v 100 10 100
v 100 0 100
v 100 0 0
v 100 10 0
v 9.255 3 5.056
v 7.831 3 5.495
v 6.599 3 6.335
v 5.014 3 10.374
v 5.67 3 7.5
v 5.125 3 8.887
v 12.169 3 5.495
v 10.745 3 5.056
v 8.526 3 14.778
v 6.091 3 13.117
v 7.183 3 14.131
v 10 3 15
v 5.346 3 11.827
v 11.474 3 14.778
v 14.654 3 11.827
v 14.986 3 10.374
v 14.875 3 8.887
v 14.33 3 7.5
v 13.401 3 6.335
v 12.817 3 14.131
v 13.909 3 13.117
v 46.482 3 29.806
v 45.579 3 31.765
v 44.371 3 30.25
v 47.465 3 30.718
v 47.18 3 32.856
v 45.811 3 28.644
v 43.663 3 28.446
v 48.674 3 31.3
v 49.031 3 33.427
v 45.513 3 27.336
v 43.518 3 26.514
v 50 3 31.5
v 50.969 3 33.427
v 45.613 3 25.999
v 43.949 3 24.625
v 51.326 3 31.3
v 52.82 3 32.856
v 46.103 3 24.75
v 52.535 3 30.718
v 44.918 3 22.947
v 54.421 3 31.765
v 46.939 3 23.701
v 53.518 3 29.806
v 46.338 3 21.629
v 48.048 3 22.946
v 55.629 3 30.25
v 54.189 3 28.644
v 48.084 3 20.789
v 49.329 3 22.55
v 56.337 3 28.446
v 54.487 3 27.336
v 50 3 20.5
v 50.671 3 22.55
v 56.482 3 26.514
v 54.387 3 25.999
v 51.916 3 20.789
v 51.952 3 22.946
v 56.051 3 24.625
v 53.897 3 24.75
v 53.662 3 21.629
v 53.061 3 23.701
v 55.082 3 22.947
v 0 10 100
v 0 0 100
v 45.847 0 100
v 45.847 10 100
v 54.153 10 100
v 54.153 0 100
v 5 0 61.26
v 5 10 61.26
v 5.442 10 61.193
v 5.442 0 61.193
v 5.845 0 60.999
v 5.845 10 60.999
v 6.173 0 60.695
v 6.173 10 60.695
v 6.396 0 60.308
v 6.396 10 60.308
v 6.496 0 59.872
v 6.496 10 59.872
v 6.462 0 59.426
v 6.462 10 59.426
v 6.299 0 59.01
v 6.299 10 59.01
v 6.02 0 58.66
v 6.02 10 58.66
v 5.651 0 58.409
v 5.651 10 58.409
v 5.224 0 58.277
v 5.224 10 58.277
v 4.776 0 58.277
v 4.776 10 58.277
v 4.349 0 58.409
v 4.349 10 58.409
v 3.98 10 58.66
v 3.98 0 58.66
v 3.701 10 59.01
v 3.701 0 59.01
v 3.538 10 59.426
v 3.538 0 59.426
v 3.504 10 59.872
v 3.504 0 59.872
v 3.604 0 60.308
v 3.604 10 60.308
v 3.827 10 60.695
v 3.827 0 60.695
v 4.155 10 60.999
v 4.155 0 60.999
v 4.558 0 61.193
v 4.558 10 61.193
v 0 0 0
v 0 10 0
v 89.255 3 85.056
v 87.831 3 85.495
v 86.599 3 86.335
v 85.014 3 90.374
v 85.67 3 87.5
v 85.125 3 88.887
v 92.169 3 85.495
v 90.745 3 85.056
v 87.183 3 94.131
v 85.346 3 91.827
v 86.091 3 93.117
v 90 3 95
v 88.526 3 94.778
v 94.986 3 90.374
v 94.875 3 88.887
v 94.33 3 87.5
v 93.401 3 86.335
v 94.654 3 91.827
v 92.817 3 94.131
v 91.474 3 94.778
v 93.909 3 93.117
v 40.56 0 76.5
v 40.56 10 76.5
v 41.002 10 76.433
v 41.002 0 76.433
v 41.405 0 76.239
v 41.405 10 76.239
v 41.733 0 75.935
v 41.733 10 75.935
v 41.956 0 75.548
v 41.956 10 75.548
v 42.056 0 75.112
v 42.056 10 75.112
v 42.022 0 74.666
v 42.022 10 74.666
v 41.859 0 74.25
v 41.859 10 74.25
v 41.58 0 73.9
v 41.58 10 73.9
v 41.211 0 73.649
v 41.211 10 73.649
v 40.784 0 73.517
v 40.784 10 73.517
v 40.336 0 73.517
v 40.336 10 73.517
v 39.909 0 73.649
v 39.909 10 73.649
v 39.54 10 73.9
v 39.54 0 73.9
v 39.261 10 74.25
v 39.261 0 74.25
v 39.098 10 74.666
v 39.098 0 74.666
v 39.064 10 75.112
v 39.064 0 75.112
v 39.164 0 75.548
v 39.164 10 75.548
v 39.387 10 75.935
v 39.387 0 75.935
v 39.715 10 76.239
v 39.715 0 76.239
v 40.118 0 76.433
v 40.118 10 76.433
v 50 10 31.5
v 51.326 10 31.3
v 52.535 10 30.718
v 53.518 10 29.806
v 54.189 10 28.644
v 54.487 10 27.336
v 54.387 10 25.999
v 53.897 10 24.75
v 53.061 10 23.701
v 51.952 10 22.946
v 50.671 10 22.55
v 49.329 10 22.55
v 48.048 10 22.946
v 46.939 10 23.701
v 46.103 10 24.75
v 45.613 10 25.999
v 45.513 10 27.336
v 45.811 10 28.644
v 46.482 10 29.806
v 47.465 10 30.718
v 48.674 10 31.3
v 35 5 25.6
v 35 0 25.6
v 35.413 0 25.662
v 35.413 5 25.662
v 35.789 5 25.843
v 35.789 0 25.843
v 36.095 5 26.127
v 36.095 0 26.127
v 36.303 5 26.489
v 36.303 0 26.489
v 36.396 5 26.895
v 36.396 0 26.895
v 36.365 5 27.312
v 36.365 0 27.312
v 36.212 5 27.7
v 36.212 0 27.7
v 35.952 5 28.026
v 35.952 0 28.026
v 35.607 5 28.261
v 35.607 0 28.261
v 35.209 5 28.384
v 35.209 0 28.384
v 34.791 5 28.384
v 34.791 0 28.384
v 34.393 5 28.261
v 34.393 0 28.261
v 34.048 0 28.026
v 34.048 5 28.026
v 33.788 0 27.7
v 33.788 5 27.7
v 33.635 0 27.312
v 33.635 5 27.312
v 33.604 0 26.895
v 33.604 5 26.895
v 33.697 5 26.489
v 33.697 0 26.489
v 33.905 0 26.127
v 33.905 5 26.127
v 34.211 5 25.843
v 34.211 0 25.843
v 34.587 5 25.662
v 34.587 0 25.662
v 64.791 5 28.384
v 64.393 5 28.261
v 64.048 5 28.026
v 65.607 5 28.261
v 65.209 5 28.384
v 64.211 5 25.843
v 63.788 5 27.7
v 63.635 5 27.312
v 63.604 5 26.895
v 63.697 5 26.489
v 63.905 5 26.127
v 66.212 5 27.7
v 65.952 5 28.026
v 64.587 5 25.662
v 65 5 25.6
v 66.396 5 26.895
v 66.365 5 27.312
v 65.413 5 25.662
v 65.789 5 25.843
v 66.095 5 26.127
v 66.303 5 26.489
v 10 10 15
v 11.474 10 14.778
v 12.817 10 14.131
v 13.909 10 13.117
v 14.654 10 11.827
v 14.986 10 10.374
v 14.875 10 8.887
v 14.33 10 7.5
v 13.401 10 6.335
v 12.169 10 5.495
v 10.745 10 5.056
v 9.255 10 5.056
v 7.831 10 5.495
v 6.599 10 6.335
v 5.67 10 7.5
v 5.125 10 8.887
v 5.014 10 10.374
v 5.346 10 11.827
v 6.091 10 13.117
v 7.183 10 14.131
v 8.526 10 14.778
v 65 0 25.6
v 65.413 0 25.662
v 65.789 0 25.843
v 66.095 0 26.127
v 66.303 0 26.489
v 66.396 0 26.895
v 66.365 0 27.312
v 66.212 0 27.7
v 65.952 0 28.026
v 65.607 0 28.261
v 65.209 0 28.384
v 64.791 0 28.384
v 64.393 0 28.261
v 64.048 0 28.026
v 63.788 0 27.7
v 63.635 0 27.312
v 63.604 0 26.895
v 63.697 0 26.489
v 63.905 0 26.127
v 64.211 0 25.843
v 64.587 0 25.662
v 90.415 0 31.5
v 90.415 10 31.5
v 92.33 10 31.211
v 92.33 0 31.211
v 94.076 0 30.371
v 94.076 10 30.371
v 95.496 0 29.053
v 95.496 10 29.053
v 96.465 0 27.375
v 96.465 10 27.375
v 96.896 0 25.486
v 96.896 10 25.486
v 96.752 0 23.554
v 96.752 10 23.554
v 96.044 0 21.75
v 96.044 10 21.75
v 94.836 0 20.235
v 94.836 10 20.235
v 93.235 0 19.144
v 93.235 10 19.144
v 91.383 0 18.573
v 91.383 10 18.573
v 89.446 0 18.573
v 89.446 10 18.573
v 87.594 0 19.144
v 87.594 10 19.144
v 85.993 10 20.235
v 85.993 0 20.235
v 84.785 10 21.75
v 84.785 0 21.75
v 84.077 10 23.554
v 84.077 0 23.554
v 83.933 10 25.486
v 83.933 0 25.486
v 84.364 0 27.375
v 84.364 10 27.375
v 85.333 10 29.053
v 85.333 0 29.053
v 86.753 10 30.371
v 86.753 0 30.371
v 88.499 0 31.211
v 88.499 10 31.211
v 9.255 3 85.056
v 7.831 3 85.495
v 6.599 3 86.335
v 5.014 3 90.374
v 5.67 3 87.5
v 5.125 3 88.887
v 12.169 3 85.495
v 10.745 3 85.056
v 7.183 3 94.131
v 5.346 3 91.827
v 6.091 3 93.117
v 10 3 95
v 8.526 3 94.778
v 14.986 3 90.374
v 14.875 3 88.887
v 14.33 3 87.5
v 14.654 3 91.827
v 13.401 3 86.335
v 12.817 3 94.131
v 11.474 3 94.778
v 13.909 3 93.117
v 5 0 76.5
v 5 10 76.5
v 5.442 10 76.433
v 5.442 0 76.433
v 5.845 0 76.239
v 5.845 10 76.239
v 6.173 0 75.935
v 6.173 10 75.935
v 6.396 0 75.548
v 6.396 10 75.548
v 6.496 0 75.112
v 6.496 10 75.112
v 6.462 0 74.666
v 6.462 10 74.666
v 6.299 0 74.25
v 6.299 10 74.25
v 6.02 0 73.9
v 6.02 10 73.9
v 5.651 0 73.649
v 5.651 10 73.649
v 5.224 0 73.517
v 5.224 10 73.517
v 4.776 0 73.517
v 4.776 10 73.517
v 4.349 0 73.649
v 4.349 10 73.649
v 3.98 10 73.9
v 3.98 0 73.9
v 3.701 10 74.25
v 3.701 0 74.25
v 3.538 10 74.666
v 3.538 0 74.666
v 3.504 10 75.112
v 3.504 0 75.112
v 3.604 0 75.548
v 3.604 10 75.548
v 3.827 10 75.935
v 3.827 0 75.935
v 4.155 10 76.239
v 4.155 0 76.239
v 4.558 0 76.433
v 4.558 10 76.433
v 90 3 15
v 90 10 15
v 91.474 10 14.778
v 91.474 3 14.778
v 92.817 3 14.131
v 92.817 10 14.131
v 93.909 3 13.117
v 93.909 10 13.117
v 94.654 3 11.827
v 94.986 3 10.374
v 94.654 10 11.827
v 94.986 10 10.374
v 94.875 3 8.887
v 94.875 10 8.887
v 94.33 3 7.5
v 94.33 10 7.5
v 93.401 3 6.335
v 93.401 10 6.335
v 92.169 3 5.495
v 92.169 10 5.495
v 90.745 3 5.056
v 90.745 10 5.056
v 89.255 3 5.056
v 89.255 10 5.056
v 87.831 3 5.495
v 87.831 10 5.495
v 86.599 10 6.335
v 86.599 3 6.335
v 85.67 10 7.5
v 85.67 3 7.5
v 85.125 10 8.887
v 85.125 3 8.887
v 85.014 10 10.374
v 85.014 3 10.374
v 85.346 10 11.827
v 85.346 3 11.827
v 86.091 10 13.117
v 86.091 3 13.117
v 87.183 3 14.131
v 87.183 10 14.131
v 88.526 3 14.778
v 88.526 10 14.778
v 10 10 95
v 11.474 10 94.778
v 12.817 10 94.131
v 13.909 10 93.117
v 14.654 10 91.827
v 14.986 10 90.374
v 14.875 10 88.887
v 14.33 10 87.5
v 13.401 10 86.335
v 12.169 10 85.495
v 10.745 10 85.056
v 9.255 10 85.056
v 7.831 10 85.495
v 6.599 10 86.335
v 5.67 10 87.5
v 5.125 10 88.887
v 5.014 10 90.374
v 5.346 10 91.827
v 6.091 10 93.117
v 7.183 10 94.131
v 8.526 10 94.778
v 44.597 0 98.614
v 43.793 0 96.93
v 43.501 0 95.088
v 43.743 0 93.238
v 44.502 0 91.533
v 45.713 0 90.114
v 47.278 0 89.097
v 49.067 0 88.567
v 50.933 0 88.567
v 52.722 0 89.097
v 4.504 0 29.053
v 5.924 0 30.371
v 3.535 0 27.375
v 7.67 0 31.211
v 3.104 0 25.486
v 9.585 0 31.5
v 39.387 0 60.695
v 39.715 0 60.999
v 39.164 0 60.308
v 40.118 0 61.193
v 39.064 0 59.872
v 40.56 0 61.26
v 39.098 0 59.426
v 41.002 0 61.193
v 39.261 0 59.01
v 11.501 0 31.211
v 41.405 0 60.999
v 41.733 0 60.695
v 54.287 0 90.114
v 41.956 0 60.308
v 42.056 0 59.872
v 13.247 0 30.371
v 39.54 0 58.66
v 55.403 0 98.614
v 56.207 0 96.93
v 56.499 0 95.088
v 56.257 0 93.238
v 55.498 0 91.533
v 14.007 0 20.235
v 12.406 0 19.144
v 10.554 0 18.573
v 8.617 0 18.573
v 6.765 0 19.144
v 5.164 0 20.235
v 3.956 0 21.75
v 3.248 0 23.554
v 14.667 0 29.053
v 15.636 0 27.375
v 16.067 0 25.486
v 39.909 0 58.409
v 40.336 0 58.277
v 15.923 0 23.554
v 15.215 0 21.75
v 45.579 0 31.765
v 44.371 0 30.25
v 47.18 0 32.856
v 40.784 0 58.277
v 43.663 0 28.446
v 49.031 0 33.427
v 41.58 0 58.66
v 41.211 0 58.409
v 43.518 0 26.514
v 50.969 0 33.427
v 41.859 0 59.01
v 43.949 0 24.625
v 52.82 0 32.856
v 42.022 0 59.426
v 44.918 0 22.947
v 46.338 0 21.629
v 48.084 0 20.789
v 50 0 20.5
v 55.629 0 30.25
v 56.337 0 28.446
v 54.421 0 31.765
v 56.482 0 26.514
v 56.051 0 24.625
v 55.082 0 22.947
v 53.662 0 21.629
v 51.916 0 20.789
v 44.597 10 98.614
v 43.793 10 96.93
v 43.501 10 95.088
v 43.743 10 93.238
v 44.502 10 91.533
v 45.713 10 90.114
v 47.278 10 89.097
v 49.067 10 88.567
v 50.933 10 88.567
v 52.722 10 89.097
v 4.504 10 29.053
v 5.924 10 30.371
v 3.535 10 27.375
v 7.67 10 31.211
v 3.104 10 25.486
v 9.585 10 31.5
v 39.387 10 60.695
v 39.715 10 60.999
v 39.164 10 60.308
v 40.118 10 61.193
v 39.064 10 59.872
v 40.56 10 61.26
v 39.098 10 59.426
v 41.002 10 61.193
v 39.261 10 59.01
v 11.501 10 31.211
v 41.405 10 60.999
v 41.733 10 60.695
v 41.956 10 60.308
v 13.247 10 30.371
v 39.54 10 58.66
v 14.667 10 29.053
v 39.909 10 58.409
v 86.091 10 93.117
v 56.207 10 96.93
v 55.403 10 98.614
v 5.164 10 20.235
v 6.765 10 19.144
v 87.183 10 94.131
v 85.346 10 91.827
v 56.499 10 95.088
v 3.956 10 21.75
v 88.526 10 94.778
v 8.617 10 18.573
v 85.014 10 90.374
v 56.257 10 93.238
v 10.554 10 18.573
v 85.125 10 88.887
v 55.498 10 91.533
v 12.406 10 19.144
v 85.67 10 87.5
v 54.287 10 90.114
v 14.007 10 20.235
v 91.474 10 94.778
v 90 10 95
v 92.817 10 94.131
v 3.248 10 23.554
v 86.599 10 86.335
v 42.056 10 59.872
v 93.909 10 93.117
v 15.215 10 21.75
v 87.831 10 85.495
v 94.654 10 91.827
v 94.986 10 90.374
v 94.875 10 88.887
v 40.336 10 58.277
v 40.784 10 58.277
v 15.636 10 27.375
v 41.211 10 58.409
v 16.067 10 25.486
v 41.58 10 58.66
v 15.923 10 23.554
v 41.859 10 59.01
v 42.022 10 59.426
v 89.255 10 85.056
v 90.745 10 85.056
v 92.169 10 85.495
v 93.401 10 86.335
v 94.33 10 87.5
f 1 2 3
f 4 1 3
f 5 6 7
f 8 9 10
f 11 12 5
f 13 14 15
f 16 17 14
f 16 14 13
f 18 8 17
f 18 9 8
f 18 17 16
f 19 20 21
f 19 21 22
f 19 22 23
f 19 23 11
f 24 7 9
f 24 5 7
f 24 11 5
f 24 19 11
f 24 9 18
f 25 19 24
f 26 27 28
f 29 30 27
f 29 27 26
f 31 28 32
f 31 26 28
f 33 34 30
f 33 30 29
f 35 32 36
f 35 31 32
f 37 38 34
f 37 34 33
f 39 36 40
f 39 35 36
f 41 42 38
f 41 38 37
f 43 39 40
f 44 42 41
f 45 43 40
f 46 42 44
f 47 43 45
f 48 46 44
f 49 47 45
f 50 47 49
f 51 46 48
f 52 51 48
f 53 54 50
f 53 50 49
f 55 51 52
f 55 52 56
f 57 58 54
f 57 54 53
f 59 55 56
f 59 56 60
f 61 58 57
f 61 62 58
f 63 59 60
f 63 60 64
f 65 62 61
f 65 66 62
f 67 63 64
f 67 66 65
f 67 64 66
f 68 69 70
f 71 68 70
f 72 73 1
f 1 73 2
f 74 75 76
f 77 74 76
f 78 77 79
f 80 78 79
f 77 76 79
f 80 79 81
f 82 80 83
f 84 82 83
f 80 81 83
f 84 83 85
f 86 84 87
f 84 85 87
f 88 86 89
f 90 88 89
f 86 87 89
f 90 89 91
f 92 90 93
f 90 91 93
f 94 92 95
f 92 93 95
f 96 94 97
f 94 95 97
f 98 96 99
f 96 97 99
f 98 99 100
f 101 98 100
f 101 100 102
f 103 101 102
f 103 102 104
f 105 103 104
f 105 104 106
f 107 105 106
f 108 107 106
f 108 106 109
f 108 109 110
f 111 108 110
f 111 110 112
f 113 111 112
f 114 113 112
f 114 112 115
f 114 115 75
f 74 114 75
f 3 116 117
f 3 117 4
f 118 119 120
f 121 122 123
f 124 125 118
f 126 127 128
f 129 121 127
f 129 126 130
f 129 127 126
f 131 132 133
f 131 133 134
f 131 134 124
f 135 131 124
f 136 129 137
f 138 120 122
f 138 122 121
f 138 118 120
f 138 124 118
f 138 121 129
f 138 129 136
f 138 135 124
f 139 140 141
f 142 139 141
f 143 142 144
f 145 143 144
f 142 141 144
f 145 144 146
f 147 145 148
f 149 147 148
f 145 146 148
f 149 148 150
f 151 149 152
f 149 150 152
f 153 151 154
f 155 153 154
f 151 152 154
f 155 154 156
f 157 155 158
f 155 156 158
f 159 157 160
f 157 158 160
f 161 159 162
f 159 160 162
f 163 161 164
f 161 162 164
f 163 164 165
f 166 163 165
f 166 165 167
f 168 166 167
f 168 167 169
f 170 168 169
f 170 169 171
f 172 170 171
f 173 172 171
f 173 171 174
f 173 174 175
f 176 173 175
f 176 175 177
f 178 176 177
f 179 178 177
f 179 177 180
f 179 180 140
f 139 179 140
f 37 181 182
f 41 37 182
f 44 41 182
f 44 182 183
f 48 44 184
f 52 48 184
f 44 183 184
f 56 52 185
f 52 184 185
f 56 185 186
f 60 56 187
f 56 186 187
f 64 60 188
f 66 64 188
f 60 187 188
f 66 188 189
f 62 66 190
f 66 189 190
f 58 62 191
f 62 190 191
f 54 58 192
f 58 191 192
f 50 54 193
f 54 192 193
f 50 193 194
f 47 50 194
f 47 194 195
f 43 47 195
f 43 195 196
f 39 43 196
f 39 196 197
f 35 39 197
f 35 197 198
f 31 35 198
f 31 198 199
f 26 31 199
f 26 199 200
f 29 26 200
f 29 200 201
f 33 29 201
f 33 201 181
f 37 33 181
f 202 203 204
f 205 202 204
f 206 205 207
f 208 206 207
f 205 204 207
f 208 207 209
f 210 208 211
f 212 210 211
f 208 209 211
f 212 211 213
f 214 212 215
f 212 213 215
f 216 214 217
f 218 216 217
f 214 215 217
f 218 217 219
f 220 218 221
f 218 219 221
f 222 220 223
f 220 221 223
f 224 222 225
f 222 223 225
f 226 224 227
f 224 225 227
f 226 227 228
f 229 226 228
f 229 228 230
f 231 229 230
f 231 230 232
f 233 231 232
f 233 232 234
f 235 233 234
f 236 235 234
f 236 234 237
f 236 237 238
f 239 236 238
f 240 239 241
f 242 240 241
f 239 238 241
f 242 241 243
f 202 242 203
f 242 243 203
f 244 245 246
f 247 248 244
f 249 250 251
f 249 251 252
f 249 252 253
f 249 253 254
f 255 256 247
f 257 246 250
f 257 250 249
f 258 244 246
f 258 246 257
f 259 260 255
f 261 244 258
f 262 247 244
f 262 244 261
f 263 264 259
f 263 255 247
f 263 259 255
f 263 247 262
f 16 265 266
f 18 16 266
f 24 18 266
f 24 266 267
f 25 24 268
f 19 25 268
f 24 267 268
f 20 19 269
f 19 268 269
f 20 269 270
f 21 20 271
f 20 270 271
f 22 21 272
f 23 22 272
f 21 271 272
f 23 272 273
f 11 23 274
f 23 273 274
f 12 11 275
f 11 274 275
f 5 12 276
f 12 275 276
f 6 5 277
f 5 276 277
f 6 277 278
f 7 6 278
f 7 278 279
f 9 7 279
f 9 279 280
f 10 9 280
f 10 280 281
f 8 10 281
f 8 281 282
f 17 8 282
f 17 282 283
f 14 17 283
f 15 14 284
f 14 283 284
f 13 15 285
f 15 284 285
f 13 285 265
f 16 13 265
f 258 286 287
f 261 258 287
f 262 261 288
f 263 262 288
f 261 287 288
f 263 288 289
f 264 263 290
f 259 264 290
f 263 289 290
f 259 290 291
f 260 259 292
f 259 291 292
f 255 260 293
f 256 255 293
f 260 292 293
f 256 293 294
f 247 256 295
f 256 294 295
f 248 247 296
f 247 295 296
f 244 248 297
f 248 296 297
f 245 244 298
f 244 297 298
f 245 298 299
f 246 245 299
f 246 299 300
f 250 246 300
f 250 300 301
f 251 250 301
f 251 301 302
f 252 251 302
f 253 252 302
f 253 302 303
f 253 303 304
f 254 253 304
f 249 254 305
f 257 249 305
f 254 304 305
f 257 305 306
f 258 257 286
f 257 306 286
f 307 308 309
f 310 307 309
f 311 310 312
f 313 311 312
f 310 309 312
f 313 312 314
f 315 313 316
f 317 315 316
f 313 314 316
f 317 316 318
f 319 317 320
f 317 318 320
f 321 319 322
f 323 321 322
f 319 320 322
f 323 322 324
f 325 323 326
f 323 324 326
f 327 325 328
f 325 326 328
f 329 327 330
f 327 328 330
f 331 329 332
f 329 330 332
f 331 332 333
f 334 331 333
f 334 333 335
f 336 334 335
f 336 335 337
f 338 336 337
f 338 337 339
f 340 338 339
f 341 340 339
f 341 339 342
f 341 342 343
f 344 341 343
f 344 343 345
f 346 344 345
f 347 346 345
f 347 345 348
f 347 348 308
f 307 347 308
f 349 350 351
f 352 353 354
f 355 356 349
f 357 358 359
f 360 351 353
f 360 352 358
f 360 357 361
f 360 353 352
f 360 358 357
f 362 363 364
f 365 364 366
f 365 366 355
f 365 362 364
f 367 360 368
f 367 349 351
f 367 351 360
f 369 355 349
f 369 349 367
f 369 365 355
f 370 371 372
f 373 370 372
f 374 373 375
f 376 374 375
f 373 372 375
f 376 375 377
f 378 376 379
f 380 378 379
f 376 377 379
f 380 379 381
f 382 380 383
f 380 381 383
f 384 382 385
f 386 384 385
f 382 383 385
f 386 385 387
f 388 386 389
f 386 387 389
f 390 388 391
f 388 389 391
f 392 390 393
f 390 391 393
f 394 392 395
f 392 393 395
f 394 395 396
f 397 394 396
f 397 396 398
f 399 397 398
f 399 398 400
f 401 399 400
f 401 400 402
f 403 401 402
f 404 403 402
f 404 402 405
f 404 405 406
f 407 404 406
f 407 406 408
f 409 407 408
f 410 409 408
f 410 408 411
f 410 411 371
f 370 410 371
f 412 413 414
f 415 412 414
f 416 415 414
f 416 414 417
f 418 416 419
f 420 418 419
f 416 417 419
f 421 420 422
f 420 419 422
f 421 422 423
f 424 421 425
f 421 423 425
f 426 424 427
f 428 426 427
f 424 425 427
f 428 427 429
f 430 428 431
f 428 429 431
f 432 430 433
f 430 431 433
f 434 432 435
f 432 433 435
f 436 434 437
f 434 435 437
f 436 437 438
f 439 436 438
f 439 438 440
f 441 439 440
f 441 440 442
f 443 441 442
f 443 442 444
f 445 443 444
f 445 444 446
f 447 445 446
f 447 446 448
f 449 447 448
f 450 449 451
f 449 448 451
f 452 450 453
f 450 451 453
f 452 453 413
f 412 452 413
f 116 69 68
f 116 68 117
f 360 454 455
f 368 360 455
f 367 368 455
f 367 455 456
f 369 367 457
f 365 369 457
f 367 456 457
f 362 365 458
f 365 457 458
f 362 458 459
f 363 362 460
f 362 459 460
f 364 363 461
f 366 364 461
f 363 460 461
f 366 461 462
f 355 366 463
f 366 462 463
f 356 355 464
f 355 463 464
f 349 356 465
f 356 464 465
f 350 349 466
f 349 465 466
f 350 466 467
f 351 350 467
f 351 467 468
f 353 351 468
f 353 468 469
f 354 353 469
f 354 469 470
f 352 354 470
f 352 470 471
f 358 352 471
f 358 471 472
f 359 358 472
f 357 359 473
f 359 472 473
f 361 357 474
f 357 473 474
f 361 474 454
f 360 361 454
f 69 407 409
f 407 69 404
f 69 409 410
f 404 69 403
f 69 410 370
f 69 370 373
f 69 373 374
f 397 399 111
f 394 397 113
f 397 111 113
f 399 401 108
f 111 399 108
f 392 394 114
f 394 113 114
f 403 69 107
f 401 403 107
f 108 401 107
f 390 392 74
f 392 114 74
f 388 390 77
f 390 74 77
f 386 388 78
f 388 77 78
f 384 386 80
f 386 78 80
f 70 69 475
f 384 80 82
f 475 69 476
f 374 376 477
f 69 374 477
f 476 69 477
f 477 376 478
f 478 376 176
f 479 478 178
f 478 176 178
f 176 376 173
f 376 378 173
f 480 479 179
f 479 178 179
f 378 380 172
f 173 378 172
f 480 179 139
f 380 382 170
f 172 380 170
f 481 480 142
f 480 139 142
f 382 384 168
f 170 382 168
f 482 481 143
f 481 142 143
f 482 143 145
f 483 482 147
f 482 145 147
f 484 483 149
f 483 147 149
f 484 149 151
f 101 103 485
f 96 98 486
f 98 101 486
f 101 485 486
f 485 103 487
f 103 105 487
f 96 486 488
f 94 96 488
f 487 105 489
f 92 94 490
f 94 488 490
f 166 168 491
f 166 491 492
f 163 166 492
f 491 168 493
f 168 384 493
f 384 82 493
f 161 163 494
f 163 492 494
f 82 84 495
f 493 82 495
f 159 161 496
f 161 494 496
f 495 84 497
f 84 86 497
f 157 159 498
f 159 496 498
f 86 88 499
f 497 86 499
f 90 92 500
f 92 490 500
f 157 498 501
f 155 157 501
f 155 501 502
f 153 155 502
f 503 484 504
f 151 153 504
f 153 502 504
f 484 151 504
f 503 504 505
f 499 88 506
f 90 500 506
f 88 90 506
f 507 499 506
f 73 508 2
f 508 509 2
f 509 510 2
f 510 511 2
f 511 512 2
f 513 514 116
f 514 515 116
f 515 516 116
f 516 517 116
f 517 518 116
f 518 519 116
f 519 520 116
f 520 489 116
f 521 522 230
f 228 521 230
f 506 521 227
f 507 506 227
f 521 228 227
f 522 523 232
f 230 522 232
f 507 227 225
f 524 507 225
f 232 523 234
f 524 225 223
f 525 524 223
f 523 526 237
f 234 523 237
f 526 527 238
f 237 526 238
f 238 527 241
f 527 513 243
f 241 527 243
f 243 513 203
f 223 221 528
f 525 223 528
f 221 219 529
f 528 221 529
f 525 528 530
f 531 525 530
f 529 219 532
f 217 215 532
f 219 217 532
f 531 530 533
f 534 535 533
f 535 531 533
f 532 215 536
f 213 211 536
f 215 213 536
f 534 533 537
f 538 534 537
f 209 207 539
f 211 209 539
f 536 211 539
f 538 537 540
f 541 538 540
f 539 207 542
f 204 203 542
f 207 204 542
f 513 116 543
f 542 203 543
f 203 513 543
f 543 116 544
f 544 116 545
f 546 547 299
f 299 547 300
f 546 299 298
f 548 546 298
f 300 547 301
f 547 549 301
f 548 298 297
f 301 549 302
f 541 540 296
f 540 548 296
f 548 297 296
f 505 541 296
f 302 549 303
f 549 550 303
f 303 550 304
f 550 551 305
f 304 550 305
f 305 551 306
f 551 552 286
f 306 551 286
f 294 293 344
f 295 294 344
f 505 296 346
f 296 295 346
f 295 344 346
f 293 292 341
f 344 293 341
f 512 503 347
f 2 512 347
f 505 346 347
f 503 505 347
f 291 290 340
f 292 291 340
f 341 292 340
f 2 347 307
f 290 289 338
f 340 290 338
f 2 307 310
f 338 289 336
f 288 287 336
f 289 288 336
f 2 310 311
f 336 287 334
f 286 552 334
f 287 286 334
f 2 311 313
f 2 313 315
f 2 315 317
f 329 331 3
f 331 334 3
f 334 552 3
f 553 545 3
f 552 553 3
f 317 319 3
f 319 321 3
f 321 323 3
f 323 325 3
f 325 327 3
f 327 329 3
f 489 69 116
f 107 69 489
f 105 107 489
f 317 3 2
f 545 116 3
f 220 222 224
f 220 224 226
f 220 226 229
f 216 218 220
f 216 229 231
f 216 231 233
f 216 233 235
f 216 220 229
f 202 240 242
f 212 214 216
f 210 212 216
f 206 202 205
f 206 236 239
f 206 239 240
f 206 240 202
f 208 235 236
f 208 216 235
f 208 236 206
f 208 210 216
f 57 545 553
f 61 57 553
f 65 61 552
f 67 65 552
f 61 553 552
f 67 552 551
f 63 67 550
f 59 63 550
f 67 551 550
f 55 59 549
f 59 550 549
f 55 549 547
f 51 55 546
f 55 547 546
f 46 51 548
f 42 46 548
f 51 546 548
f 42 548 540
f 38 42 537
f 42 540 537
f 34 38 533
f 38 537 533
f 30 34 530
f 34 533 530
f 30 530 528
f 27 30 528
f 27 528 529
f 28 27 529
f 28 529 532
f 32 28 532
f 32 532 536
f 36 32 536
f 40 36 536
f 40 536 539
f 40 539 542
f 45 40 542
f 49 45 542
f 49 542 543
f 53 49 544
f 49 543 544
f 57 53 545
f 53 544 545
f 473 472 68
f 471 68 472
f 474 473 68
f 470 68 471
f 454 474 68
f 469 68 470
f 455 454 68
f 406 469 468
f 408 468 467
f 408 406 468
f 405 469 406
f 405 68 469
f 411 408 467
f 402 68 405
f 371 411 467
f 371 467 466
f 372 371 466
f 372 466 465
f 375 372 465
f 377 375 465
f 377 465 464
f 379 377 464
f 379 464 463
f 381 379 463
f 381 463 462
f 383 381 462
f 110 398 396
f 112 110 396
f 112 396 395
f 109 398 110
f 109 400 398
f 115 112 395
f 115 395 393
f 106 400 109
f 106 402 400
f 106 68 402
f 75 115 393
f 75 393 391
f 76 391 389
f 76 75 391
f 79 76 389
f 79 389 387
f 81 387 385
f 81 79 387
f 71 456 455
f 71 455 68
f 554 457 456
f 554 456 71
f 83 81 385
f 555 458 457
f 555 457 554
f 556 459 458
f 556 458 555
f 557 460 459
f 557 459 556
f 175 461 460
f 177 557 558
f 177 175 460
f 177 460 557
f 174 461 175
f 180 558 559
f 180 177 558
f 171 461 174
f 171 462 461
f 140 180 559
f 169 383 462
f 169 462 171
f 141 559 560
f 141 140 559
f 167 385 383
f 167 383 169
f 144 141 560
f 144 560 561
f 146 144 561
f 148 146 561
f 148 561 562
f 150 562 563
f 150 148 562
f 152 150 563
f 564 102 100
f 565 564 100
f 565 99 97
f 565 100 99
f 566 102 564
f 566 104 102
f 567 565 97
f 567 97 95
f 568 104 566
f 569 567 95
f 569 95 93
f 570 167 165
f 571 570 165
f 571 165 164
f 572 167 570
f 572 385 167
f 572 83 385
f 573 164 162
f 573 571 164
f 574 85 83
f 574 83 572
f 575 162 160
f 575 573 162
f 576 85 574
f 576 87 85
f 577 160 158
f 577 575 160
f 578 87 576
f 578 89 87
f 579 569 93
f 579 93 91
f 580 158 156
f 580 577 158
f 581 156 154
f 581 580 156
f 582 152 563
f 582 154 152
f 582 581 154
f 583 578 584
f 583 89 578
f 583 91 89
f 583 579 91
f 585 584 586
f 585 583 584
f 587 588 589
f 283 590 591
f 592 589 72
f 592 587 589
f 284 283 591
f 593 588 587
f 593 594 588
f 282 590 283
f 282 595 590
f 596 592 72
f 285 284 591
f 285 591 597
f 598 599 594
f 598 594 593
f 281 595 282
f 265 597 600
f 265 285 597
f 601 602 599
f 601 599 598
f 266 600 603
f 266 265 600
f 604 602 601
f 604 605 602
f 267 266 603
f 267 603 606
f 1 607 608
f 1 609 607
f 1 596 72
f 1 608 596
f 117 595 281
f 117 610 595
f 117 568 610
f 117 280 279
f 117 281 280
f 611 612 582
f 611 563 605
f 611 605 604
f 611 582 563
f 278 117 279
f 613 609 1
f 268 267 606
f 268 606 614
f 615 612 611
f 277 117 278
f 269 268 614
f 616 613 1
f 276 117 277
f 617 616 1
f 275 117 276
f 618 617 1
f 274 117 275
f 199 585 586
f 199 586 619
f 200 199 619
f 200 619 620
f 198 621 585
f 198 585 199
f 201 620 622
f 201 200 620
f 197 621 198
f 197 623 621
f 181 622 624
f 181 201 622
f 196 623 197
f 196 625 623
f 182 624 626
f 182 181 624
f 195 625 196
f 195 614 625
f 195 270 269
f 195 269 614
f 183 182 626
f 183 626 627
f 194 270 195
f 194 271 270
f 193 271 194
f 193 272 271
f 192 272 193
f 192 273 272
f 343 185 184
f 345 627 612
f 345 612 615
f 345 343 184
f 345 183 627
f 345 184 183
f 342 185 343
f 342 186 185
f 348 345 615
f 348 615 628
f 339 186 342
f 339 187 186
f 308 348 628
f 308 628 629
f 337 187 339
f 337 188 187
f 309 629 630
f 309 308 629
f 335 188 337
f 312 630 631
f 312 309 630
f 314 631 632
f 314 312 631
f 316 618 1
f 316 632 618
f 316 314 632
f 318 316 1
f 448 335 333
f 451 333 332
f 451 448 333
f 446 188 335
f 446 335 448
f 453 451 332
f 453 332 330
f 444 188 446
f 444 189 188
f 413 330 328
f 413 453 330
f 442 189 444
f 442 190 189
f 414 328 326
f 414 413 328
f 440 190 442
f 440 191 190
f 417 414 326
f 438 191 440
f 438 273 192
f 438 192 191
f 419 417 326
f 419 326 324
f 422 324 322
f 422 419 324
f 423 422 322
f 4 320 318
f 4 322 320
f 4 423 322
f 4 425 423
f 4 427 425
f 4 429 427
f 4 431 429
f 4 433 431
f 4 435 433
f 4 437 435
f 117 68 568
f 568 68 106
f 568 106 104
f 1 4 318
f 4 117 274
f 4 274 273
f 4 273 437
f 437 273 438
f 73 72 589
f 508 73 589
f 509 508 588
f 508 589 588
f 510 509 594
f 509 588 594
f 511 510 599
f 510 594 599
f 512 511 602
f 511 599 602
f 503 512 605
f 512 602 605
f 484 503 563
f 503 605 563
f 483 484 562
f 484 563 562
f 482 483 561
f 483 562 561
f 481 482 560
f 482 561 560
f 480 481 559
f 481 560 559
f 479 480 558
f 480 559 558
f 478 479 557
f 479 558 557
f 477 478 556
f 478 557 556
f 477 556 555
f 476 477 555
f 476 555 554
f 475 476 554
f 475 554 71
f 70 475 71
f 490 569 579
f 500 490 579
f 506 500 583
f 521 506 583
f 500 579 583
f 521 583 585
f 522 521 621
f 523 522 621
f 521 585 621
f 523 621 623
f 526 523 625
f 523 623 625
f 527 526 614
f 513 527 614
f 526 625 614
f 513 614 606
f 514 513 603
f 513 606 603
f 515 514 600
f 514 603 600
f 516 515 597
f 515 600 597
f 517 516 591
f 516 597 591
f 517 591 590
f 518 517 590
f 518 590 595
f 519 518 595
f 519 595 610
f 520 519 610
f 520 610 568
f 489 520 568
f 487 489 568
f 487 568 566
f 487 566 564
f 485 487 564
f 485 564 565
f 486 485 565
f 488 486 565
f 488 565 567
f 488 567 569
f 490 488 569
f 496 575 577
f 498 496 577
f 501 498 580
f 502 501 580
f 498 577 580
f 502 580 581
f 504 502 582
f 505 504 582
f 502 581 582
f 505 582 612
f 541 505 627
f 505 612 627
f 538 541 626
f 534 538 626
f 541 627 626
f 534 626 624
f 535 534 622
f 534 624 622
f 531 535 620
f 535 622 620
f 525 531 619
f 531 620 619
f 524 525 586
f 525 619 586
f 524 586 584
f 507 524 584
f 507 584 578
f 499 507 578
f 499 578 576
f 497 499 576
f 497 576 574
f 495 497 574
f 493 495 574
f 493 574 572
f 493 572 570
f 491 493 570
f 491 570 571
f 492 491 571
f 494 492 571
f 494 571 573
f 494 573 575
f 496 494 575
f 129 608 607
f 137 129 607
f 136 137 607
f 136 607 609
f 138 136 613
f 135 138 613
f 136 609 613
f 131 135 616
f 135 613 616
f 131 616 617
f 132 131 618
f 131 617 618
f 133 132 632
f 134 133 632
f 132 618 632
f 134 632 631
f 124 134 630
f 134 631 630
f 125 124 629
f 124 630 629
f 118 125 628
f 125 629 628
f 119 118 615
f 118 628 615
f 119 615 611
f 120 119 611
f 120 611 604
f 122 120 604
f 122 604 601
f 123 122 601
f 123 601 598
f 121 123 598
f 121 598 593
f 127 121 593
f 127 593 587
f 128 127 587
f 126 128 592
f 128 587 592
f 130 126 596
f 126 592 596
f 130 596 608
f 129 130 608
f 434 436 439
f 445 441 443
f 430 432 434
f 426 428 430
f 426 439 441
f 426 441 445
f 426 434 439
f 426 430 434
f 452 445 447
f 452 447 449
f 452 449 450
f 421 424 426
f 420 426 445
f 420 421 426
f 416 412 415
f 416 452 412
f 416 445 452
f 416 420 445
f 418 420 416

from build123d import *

# Parameters (mm, degrees)
SKETCH_1_W          = 100
SKETCH_1_H          = 100
EXTRUDE_1_DEPTH     = 10
SKETCH_2_R          = 5
CUT_EXTRUDE_1_DEPTH = 7
SKETCH_3_R          = 6.5
CUT_EXTRUDE_2_DEPTH = 142.774468788
SKETCH_4_R          = 4.5
CUT_EXTRUDE_3_DEPTH = 142.774468788
SKETCH_5_R          = 6.5
CUT_EXTRUDE_4_DEPTH = 3
SKETCH_6_R          = 1.5
CUT_EXTRUDE_5_DEPTH = 142.774468788
SKETCH_7_R          = 1.4
CUT_EXTRUDE_6_DEPTH = 5


with BuildPart() as part:
    # 草图1 → 凸台-拉伸1 (new body)
    with BuildSketch(Plane(origin=(0, 0, 0), x_dir=(1, 0, 0), z_dir=(0, 1, 0))):
        with Locations((50, -50)):
            Rectangle(SKETCH_1_W, SKETCH_1_H)
    extrude(amount=EXTRUDE_1_DEPTH)

    # 草图2 → 切除-拉伸1 (cut)
    with BuildSketch(Plane(origin=(0, 10, 0), x_dir=(1, 0, 0), z_dir=(0, 1, 0))):
        with Locations(Location((10, -10, 0), (0, 0, 270))):
            Circle(SKETCH_2_R)
        with Locations(Location((90, -10, 0), (0, 0, 270))):
            Circle(SKETCH_2_R)
        with Locations(Location((10, -90, 0), (0, 0, 270))):
            Circle(SKETCH_2_R)
        with Locations(Location((90, -90, 0), (0, 0, 270))):
            Circle(SKETCH_2_R)
    extrude(amount=-CUT_EXTRUDE_1_DEPTH, mode=Mode.SUBTRACT)

    # 草图3 → 切除-拉伸2 (cut, through all)
    with BuildSketch(Plane(origin=(0, 10, 0), x_dir=(1, 0, 0), z_dir=(0, 1, 0))):
        with Locations((50, -95)):
            Circle(SKETCH_3_R)
        with Locations(Location((90.414518843, -25, 0), (0, 0, 270))):
            Circle(SKETCH_3_R)
        with Locations(Location((9.585481157, -25, 0), (0, 0, 270))):
            Circle(SKETCH_3_R)
    extrude(amount=-CUT_EXTRUDE_2_DEPTH, mode=Mode.SUBTRACT)

    # 草图4 → 切除-拉伸3 (cut, through all)
    with BuildSketch(Plane(origin=(0, 10, 0), x_dir=(1, 0, 0), z_dir=(0, 1, 0))):
        with Locations(Location((50, -27, 0), (0, 0, 270))):
            Circle(SKETCH_4_R)
    extrude(amount=-CUT_EXTRUDE_3_DEPTH, mode=Mode.SUBTRACT)

    # 草图5 → 切除-拉伸4 (cut)
    with BuildSketch(Plane(origin=(0, 0, 0), x_dir=(-1, 0, 0), z_dir=(0, -1, 0))):
        with Locations(Location((-50, -27, 0), (0, 0, 90))):
            Circle(SKETCH_5_R)
    extrude(amount=-CUT_EXTRUDE_4_DEPTH, mode=Mode.SUBTRACT)

    # 草图6 → 切除-拉伸5 (cut, through all)
    with BuildSketch(Plane(origin=(0, 10, 0), x_dir=(1, 0, 0), z_dir=(0, 1, 0))):
        with Locations(Location((40.56, -59.76, 0), (0, 0, 270))):
            Circle(SKETCH_6_R)
        with Locations(Location((40.56, -75, 0), (0, 0, 270))):
            Circle(SKETCH_6_R)
        with Locations(Location((5, -59.76, 0), (0, 0, 270))):
            Circle(SKETCH_6_R)
        with Locations(Location((5, -75, 0), (0, 0, 270))):
            Circle(SKETCH_6_R)
    extrude(amount=-CUT_EXTRUDE_5_DEPTH, mode=Mode.SUBTRACT)

    # 草图7 → 切除-拉伸6 (cut)
    with BuildSketch(Plane(origin=(0, 0, 0), x_dir=(-1, 0, 0), z_dir=(0, -1, 0))):
        with Locations(Location((-65, -27, 0), (0, 0, 90))):
            Circle(SKETCH_7_R)
        with Locations(Location((-35, -27, 0), (0, 0, 90))):
            Circle(SKETCH_7_R)
    extrude(amount=-CUT_EXTRUDE_6_DEPTH, mode=Mode.SUBTRACT)


solid = part.part
